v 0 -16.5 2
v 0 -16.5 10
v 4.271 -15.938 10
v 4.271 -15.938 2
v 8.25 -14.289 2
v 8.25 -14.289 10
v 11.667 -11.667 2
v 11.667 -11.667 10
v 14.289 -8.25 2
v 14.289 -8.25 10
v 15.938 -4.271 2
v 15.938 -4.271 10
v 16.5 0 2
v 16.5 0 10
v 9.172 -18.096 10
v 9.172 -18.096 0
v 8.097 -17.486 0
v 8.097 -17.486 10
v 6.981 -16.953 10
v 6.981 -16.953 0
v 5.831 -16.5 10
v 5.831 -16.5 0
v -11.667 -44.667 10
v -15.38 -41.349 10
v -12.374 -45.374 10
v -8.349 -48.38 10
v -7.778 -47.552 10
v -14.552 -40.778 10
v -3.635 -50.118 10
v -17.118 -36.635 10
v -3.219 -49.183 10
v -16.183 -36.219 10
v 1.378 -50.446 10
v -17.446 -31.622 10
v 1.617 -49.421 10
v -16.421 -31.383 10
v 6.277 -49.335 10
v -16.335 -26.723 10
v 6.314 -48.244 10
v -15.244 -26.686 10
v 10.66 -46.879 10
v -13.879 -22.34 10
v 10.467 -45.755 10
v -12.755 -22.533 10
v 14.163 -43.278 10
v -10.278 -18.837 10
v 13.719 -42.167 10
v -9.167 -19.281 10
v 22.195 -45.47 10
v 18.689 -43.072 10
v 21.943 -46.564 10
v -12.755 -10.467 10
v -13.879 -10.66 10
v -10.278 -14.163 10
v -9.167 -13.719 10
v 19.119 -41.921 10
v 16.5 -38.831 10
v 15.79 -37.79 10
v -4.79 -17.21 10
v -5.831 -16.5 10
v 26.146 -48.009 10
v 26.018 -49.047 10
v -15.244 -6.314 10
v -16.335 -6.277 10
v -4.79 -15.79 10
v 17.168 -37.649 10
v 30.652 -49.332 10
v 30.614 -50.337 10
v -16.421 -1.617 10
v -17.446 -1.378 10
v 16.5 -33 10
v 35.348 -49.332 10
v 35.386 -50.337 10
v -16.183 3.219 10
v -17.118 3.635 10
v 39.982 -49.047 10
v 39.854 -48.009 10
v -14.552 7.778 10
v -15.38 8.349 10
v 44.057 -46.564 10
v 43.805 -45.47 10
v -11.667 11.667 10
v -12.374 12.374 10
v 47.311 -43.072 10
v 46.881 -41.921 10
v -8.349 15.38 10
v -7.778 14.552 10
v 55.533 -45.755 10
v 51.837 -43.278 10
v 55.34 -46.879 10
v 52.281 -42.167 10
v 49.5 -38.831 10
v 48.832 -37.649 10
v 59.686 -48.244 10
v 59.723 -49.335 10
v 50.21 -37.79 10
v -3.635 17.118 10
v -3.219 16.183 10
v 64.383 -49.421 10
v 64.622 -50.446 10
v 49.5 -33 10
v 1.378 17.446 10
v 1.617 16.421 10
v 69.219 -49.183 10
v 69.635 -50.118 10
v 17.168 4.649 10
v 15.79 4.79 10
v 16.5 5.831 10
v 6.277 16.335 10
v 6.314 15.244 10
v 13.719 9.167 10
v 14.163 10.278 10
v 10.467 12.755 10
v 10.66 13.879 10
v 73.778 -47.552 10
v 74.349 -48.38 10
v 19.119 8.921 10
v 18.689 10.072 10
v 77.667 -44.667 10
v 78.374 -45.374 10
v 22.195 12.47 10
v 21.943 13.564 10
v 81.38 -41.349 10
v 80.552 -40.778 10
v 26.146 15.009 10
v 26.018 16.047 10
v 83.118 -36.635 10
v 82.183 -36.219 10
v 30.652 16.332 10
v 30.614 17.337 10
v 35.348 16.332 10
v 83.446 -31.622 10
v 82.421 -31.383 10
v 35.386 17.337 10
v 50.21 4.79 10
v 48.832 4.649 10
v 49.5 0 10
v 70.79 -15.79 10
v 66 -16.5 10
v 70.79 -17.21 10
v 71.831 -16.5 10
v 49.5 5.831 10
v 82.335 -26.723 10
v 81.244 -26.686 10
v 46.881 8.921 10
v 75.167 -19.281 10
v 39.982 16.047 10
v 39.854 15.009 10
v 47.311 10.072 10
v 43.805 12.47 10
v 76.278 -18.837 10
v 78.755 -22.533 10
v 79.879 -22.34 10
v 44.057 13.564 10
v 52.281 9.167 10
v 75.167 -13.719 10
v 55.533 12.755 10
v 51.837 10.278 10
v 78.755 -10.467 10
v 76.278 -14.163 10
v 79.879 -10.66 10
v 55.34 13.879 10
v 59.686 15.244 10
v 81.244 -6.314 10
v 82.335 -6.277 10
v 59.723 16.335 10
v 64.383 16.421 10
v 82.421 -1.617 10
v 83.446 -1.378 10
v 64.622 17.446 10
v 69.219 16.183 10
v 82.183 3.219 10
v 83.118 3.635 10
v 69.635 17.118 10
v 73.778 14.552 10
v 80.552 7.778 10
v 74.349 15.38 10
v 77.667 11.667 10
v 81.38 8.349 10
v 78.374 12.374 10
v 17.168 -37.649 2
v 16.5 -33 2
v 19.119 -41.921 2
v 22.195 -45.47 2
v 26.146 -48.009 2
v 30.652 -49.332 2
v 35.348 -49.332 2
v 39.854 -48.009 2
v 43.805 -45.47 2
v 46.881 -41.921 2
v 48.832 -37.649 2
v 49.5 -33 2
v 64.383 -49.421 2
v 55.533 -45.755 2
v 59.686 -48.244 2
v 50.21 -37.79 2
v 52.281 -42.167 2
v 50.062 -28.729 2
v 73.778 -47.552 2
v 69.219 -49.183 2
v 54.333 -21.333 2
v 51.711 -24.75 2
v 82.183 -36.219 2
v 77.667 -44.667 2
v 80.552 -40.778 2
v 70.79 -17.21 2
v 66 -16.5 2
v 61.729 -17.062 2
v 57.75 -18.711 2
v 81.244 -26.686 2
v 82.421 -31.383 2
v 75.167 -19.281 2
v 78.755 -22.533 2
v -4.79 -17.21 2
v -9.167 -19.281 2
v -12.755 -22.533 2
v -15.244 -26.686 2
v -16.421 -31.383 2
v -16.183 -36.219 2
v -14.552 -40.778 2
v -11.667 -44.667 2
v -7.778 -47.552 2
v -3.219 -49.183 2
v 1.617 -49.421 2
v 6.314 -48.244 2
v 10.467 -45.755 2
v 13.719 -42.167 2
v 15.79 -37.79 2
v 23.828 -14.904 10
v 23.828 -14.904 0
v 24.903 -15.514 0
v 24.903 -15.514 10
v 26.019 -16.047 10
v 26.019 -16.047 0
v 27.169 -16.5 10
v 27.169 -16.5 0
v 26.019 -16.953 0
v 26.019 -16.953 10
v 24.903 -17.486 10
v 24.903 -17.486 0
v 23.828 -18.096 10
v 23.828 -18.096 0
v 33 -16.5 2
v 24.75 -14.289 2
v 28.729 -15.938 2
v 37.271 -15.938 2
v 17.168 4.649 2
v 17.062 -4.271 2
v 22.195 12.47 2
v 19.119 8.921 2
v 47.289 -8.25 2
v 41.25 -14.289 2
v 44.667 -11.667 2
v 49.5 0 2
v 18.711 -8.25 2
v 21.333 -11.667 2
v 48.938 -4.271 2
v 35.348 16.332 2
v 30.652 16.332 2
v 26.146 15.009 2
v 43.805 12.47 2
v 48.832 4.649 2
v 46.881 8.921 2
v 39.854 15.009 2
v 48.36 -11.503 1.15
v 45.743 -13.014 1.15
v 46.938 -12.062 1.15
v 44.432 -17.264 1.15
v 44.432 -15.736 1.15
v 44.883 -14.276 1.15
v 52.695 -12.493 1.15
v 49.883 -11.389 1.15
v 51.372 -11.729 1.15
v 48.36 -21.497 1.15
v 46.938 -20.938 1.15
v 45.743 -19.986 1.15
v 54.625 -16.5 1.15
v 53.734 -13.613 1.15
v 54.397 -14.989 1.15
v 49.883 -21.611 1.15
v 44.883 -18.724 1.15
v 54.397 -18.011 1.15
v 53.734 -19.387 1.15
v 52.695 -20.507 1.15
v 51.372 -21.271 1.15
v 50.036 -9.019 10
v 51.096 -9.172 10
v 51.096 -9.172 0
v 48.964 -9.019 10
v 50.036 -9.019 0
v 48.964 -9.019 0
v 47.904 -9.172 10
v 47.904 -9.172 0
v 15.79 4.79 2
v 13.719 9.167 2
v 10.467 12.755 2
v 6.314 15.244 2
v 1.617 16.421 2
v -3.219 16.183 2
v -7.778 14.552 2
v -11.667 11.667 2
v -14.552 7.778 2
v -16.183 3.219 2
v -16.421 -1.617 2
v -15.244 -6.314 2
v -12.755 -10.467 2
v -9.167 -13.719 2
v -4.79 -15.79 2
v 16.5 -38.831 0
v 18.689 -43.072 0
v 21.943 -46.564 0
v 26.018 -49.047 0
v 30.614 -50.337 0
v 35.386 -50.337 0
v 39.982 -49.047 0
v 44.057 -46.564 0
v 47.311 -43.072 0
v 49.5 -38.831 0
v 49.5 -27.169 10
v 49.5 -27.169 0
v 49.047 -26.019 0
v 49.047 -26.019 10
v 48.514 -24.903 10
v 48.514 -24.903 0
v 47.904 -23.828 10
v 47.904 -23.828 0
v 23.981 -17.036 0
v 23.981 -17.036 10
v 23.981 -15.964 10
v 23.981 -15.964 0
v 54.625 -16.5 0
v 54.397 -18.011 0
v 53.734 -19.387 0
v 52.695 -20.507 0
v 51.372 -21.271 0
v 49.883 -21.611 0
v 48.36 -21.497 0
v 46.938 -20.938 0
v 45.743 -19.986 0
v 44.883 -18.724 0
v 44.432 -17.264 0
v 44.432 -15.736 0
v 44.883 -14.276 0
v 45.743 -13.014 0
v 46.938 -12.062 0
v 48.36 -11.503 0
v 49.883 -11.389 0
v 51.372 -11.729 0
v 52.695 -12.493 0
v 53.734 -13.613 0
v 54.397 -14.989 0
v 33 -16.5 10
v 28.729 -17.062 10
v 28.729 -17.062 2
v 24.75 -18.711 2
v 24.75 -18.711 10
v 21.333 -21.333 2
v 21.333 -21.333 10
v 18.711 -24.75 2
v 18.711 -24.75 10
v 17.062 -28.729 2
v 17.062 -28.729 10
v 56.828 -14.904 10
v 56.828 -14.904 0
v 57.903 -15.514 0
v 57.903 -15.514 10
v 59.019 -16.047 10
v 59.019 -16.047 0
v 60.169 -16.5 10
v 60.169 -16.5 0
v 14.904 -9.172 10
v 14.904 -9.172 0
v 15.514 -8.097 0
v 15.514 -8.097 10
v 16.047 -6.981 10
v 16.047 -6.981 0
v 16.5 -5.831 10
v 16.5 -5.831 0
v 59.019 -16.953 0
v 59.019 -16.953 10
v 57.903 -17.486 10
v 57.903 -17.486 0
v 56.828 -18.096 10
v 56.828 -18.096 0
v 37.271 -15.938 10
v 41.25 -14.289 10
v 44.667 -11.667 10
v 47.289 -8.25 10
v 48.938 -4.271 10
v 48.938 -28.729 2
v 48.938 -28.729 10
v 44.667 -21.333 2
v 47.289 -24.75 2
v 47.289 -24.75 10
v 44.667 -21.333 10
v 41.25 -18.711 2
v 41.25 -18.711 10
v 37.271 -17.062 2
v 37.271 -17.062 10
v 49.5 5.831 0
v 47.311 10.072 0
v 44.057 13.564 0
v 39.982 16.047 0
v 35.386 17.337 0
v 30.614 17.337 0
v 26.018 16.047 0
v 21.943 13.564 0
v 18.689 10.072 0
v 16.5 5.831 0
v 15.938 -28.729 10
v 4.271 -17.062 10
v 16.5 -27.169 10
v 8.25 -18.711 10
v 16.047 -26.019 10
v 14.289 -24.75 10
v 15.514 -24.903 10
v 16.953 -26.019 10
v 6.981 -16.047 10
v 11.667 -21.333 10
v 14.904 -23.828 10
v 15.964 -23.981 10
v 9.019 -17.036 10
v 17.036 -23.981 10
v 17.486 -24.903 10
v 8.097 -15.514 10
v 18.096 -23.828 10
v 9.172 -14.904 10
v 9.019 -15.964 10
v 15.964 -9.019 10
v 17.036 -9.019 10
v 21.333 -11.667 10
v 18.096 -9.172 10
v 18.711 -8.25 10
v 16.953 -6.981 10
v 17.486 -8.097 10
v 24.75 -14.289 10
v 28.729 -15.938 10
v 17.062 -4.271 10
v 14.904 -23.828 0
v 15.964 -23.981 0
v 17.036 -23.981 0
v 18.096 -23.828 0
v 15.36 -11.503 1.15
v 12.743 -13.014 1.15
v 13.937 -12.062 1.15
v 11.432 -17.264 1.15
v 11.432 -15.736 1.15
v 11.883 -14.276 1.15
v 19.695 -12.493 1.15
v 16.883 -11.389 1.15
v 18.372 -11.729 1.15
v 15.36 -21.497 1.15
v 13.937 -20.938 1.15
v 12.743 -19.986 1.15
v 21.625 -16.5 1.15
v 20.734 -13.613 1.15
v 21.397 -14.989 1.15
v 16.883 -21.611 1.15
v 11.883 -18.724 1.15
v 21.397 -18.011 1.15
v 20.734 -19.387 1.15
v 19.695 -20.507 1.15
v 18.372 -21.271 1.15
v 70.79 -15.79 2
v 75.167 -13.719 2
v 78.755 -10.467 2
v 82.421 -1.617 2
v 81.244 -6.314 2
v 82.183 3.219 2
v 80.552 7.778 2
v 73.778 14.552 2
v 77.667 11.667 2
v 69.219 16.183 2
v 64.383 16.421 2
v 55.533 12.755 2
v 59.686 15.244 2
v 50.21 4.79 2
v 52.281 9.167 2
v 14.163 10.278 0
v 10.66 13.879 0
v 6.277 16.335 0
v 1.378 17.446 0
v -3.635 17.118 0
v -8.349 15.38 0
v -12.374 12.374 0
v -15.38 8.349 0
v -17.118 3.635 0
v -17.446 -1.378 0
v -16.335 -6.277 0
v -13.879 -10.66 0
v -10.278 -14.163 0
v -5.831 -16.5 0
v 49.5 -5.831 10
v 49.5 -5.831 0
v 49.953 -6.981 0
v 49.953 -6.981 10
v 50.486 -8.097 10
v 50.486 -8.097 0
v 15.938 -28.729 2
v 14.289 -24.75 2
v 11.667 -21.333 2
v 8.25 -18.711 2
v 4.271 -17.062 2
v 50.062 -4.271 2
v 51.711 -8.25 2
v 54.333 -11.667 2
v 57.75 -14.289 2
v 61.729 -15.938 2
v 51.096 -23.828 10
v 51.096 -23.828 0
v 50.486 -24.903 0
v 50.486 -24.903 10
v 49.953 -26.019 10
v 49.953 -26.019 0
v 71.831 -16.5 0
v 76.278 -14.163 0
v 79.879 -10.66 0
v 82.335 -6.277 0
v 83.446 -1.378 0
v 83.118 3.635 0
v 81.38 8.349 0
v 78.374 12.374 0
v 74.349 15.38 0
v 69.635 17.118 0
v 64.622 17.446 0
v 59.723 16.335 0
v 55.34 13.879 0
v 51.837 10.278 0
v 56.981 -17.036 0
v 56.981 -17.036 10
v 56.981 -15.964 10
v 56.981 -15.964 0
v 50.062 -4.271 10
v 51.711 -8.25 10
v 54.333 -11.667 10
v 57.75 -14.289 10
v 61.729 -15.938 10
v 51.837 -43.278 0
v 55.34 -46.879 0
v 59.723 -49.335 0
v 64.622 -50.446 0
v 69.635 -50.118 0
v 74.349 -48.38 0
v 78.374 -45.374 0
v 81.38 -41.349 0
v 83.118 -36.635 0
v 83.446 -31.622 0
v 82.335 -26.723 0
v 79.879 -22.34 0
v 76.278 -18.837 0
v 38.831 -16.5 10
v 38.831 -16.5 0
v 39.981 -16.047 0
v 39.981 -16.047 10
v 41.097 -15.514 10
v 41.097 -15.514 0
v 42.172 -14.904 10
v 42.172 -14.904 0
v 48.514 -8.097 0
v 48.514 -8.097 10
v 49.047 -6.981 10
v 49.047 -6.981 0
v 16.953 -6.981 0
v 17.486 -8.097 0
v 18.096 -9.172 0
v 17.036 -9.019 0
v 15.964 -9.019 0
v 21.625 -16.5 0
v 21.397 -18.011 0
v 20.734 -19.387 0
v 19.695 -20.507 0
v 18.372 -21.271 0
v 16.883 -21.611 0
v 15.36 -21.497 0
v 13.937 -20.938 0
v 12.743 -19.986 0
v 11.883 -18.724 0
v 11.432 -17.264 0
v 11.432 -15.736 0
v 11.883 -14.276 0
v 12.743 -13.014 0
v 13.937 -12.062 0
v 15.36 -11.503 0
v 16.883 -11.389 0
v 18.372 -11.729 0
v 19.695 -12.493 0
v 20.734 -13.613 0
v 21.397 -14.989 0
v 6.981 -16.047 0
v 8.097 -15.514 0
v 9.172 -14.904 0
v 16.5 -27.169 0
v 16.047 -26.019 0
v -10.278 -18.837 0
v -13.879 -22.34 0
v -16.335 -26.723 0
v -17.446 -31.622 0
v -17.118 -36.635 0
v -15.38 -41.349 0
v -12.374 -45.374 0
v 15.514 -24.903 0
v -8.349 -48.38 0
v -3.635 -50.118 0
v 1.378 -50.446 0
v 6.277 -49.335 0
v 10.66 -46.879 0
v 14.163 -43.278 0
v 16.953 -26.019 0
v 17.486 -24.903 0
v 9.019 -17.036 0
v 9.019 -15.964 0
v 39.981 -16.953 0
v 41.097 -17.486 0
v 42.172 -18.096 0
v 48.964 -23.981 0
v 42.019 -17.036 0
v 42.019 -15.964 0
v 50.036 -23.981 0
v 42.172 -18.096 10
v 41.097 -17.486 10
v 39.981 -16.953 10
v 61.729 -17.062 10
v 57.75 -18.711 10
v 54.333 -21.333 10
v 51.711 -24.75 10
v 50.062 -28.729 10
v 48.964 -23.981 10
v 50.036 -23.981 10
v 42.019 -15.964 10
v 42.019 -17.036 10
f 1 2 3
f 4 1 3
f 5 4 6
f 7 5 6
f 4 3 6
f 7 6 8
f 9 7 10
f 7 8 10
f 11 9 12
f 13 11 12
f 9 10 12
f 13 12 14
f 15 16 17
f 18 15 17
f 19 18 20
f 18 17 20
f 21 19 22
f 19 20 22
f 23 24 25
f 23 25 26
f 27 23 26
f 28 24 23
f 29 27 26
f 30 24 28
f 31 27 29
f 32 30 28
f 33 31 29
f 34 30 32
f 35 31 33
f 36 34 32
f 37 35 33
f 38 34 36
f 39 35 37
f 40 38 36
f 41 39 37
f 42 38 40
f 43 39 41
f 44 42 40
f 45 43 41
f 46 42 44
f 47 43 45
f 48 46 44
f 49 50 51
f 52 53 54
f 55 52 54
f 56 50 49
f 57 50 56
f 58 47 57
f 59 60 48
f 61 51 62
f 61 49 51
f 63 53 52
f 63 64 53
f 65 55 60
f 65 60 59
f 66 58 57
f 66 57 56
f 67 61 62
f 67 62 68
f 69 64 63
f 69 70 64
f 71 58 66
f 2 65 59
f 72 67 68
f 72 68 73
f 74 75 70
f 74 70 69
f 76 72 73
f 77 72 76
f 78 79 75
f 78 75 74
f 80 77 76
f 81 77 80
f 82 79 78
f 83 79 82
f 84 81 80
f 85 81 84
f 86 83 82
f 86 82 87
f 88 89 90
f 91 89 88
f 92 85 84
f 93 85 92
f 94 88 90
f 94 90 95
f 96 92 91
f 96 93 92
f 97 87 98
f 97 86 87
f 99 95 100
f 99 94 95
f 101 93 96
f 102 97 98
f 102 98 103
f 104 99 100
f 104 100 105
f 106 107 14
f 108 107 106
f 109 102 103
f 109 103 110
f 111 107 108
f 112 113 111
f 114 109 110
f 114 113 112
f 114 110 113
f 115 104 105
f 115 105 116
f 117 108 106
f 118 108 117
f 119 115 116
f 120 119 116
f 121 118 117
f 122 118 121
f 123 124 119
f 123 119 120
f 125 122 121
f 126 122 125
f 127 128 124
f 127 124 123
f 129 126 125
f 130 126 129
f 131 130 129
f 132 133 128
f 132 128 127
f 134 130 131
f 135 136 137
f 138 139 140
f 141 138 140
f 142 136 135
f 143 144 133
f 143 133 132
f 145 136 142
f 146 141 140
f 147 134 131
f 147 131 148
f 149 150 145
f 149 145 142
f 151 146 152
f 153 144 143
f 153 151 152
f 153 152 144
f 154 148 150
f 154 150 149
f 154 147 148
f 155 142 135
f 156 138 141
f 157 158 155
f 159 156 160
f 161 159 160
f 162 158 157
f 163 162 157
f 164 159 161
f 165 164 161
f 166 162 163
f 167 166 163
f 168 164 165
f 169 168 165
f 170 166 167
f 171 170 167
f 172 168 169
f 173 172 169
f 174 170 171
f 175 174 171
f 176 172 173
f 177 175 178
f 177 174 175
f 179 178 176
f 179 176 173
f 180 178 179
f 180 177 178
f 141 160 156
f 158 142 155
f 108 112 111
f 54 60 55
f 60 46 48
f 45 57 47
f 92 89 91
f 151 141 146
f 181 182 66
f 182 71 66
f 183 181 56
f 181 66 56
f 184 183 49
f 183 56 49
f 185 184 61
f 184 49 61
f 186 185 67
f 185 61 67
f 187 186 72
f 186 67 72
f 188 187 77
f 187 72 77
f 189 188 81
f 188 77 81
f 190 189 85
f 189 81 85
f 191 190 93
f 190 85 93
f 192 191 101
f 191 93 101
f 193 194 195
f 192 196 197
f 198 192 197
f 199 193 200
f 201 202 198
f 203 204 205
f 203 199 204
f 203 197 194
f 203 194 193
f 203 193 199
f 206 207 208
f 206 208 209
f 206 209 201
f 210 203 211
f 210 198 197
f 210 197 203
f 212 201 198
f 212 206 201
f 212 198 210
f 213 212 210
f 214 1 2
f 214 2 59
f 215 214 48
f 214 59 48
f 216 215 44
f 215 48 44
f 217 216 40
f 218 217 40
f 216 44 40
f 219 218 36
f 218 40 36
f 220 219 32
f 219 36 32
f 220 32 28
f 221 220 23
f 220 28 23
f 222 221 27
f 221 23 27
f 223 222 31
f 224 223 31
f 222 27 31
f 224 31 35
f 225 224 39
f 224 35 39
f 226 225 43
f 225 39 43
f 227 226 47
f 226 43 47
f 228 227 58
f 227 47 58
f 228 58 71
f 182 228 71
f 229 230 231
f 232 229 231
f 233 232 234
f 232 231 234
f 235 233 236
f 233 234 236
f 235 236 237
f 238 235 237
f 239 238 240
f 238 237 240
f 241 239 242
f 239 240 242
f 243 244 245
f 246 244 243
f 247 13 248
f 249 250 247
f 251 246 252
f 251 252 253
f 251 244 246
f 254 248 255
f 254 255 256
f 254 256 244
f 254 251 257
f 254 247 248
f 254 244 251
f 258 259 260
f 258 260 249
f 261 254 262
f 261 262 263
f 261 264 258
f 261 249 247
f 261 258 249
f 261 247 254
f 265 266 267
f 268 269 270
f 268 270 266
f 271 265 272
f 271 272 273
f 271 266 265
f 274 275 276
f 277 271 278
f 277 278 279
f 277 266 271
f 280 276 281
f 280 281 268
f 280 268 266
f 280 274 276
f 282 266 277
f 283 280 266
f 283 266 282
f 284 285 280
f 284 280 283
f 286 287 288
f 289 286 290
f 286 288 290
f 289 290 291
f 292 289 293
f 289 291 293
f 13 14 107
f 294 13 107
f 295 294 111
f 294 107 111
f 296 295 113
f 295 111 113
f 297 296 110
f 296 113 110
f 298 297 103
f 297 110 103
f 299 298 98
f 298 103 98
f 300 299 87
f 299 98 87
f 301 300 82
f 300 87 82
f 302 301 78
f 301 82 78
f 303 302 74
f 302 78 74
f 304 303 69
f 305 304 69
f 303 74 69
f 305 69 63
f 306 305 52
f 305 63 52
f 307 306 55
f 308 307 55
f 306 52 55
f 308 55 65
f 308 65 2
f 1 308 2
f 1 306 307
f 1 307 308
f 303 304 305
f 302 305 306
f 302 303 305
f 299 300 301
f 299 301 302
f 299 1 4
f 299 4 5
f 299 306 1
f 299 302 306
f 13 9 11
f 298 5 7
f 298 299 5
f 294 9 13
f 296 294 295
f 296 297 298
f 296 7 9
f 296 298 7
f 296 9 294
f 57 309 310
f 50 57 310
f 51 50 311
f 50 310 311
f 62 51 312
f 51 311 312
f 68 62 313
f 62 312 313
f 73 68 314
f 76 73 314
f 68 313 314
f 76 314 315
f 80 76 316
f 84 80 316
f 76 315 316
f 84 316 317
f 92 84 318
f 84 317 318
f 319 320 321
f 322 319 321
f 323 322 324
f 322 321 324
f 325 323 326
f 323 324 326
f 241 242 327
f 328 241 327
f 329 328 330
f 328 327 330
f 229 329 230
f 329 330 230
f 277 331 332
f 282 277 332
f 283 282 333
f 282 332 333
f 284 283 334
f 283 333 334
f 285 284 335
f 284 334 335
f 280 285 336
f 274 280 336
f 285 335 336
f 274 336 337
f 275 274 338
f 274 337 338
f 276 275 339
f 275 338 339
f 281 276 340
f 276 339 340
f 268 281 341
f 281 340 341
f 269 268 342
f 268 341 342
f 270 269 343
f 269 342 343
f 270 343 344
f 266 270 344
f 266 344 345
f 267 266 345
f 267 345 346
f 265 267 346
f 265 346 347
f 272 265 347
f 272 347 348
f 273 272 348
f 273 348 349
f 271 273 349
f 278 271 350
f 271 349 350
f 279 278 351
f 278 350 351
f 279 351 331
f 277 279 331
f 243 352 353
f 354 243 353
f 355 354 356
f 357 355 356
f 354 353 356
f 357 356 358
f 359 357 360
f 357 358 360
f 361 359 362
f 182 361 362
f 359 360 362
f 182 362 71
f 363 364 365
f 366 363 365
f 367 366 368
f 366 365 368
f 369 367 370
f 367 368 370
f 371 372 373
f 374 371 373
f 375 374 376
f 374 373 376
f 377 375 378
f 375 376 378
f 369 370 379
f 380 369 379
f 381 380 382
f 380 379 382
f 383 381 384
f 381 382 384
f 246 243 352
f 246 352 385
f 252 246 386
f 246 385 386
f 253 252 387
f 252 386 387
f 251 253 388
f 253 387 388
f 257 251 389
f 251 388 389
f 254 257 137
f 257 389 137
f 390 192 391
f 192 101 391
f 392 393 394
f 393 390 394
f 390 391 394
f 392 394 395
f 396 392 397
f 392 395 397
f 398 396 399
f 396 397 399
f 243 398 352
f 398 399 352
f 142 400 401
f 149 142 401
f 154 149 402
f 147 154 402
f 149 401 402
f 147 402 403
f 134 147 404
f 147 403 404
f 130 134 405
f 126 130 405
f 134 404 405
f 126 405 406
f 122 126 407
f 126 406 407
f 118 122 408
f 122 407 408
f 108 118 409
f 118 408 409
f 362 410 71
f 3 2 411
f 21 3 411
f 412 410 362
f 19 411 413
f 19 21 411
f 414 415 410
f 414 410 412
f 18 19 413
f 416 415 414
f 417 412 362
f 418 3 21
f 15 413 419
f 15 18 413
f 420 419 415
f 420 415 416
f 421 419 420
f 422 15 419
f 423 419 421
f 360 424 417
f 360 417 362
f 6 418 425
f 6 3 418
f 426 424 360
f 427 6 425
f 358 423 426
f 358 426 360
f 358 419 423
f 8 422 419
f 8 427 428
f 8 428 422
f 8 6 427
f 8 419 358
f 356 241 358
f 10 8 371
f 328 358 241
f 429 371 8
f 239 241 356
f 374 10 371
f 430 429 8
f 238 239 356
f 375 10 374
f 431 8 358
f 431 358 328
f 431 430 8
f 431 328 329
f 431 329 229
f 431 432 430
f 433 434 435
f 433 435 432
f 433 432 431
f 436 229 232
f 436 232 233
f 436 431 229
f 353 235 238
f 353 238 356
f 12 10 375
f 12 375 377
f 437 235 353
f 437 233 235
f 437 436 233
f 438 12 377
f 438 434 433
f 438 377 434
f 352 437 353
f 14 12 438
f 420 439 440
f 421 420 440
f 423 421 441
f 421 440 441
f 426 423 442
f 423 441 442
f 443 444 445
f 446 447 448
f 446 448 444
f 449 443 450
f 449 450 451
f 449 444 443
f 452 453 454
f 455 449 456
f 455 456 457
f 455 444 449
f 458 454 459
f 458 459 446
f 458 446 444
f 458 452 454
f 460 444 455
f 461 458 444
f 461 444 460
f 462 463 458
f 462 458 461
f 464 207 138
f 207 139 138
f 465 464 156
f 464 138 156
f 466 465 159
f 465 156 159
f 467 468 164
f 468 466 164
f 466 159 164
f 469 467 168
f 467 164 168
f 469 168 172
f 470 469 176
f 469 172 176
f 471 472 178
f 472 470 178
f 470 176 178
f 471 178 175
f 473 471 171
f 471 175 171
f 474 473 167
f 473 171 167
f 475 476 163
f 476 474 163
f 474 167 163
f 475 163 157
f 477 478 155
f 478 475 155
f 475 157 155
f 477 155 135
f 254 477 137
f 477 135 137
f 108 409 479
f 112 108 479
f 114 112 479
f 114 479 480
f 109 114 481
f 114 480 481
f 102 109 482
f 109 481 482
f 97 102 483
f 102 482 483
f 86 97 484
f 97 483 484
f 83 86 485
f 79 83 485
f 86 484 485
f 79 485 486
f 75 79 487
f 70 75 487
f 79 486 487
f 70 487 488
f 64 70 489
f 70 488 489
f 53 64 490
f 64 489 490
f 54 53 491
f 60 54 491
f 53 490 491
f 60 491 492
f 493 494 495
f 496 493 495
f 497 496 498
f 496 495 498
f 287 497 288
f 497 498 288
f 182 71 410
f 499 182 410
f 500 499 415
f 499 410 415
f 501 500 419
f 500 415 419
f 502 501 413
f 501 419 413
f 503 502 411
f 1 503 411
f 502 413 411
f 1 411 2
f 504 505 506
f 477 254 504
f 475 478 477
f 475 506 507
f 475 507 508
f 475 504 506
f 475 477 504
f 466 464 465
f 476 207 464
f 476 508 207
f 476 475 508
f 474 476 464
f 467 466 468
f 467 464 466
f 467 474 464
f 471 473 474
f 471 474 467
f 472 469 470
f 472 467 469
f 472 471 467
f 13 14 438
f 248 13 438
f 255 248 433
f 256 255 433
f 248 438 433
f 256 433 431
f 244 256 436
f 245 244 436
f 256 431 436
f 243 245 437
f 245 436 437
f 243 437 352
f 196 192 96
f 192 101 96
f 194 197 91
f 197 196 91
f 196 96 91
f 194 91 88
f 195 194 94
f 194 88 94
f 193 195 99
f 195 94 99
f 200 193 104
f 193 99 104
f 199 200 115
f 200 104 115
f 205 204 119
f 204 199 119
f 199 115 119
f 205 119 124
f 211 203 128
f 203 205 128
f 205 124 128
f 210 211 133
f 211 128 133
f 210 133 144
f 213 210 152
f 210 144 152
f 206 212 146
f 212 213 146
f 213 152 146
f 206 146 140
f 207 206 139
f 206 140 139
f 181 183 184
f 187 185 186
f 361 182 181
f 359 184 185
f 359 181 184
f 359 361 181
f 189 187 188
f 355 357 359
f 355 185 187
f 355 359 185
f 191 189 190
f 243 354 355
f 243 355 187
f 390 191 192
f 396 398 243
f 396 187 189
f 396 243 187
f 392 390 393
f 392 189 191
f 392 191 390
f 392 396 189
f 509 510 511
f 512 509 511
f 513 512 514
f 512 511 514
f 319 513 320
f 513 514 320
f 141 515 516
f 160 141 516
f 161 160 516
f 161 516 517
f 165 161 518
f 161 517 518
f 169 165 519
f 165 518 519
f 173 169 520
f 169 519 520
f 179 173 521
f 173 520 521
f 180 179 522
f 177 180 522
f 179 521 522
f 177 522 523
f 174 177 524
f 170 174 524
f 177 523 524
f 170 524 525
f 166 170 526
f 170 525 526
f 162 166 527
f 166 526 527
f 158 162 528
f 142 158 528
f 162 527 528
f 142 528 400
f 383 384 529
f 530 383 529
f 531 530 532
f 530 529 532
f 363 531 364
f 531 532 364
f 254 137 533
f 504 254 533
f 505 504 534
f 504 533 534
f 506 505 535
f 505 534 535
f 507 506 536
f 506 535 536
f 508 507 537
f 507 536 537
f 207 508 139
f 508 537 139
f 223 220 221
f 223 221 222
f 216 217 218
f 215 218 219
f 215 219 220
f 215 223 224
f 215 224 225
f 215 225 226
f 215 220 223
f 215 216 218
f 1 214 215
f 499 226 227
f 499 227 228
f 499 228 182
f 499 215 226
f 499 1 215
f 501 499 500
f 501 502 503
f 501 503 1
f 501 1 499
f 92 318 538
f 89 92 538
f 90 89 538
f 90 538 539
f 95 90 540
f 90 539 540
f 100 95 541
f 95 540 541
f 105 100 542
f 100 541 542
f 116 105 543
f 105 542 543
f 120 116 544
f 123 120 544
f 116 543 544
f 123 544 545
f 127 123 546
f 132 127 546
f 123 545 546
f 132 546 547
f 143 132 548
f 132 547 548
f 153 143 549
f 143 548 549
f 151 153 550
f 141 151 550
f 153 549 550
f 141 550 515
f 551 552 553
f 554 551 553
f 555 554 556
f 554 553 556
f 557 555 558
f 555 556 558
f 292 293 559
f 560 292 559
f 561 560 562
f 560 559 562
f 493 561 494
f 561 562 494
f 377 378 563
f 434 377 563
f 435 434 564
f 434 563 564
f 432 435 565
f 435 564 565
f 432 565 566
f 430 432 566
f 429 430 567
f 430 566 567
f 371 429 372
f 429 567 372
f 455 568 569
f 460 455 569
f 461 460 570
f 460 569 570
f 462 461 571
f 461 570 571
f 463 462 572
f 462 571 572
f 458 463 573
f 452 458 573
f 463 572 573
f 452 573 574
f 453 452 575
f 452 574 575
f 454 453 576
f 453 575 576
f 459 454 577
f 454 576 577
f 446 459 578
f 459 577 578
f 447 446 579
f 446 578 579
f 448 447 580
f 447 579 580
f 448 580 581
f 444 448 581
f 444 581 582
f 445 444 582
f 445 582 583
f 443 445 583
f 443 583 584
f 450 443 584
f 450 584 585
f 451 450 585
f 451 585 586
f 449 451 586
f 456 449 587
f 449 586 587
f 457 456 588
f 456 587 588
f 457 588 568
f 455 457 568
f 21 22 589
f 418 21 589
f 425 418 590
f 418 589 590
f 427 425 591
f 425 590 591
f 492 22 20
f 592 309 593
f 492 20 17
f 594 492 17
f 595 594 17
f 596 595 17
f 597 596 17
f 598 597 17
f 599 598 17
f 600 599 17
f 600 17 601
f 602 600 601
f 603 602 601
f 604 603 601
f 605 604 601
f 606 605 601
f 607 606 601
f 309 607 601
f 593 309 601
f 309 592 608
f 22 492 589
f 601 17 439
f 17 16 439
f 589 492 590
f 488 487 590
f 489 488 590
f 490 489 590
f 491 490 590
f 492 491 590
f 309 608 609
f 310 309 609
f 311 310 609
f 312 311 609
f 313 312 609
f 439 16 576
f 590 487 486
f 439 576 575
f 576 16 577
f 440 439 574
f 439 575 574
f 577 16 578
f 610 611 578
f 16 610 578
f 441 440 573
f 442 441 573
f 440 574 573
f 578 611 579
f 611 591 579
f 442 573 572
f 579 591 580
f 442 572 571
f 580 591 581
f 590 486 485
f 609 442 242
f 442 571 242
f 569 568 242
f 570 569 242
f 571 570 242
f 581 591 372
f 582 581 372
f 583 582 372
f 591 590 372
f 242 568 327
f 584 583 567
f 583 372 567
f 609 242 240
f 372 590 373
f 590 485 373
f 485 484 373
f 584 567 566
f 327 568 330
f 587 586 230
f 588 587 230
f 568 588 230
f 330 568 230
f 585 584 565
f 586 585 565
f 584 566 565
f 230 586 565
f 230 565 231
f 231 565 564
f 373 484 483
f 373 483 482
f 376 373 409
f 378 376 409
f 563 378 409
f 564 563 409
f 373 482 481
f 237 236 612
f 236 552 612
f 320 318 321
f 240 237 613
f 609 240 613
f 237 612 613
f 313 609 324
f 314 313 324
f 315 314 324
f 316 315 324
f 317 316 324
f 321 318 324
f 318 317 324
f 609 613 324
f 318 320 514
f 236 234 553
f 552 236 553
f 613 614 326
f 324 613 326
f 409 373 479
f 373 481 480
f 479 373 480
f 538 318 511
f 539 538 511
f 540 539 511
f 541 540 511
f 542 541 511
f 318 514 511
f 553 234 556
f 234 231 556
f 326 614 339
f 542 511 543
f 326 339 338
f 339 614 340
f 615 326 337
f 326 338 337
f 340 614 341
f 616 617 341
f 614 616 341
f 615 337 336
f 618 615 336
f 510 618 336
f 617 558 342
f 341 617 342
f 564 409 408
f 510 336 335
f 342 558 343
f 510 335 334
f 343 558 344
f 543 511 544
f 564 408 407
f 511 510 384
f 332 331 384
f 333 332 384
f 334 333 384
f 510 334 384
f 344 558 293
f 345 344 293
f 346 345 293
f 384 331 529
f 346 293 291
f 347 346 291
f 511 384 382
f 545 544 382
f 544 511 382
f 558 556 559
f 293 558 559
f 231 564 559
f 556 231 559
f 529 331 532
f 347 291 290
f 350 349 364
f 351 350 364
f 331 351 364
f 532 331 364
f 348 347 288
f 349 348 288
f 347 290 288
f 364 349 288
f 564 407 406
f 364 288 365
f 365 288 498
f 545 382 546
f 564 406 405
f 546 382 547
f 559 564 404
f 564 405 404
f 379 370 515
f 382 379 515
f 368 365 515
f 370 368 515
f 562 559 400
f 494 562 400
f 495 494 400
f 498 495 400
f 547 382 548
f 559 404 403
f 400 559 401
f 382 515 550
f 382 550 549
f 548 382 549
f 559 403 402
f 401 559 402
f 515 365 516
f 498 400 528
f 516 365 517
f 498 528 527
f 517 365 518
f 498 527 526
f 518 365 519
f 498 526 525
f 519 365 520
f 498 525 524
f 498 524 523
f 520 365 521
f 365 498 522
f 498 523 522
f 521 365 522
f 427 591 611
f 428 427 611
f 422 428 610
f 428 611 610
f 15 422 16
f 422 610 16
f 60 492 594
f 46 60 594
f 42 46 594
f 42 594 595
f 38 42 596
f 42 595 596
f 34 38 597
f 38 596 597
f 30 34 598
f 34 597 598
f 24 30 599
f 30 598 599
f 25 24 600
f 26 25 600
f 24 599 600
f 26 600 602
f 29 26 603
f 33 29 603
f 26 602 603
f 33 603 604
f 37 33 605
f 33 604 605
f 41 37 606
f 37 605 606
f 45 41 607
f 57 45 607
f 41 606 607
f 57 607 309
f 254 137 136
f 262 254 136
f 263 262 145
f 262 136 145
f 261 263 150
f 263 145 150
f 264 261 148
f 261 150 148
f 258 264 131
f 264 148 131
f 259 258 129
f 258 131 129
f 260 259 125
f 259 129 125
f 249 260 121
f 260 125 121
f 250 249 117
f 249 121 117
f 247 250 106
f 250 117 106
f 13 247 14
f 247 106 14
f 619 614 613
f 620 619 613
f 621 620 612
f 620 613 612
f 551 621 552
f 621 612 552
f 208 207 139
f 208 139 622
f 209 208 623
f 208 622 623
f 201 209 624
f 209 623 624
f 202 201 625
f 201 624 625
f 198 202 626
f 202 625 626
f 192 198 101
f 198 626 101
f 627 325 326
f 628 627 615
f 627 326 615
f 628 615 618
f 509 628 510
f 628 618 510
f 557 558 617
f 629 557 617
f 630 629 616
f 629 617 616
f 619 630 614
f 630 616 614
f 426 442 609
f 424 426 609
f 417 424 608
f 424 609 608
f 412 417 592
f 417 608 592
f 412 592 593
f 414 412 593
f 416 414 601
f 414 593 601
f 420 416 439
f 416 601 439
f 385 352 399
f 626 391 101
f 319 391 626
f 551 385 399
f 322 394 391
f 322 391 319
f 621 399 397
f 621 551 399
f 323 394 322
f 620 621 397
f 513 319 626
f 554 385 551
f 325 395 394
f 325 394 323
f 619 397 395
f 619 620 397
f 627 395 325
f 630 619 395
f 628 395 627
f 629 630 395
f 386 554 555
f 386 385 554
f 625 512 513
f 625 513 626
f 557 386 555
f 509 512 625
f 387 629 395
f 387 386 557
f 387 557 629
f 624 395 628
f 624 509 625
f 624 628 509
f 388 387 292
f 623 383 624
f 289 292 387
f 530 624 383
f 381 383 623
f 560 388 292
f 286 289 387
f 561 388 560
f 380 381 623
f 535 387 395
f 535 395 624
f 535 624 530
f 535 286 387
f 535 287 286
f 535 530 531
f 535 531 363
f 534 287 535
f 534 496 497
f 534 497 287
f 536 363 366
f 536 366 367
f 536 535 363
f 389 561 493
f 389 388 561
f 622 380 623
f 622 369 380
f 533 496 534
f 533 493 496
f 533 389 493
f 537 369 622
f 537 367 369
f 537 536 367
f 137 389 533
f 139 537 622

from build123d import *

# Parameters (mm, degrees)
PAD_DEPTH       = 10
SKETCH001_R     = 16.5
POCKET_DEPTH    = 8
SKETCH002_R     = 16.5
POCKET001_DEPTH = 8
SKETCH003_R     = 16.5
POCKET002_DEPTH = 8
SKETCH004_R     = 16.5
POCKET003_DEPTH = 8
SKETCH005_R     = 16.5
POCKET004_DEPTH = 8
SKETCH006_R     = 16.5
POCKET005_DEPTH = 8
SKETCH007_R     = 5.125
POCKET006_DEPTH = 1.15
SKETCH008_R     = 5.125
POCKET007_DEPTH = 1.15


with BuildPart() as part:
    # Sketch → Pad (new body)
    with BuildSketch(Plane.XY):
        with BuildLine():
            ThreePointArc((71.830952, -16.5), (78.374369, 12.374369), (49.5, 5.830952))
            ThreePointArc((49.5, 5.830952), (33, 17.5), (16.5, 5.830952))
            ThreePointArc((16.5, 5.830952), (-12.374369, 12.374369), (-5.830952, -16.5))
            ThreePointArc((-5.830952, -16.5), (-12.374369, -45.374369), (16.5, -38.830952))
            ThreePointArc((16.5, -38.830952), (33, -50.5), (49.5, -38.830952))
            ThreePointArc((49.5, -38.830952), (78.374369, -45.374369), (71.830952, -16.5))
        make_face()
        with BuildLine():
            ThreePointArc((5.830952, -16.5), (7.543698, -15.790586), (9.171788, -14.903969))
            ThreePointArc((9.171788, -14.903969), (9, -16.5), (9.171788, -18.096031))
            ThreePointArc((9.171788, -18.096031), (7.543698, -17.209414), (5.830952, -16.5))
        make_face(mode=Mode.SUBTRACT)
        with BuildLine():
            ThreePointArc((47.903969, -9.171788), (48.790586, -7.543698), (49.5, -5.830952))
            ThreePointArc((49.5, -5.830952), (50.209414, -7.543698), (51.096031, -9.171788))
            ThreePointArc((51.096031, -9.171788), (49.5, -9), (47.903969, -9.171788))
        make_face(mode=Mode.SUBTRACT)
        with BuildLine():
            ThreePointArc((18.096031, -23.828212), (17.209414, -25.456302), (16.5, -27.169048))
            ThreePointArc((16.5, -27.169048), (15.790586, -25.456302), (14.903969, -23.828212))
            ThreePointArc((14.903969, -23.828212), (16.5, -24), (18.096031, -23.828212))
        make_face(mode=Mode.SUBTRACT)
        with BuildLine():
            ThreePointArc((47.903969, -23.828212), (49.5, -24), (51.096031, -23.828212))
            ThreePointArc((51.096031, -23.828212), (50.209414, -25.456302), (49.5, -27.169048))
            ThreePointArc((49.5, -27.169048), (48.790586, -25.456302), (47.903969, -23.828212))
        make_face(mode=Mode.SUBTRACT)
        with BuildLine():
            ThreePointArc((14.903969, -9.171788), (15.790586, -7.543698), (16.5, -5.830952))
            ThreePointArc((16.5, -5.830952), (17.209414, -7.543698), (18.096031, -9.171788))
            ThreePointArc((18.096031, -9.171788), (16.5, -9), (14.903969, -9.171788))
        make_face(mode=Mode.SUBTRACT)
        with BuildLine():
            ThreePointArc((23.828212, -18.096031), (24, -16.5), (23.828212, -14.903969))
            ThreePointArc((23.828212, -14.903969), (25.456302, -15.790586), (27.169048, -16.5))
            ThreePointArc((27.169048, -16.5), (25.456302, -17.209414), (23.828212, -18.096031))
        make_face(mode=Mode.SUBTRACT)
        with BuildLine():
            ThreePointArc((42.171788, -18.096031), (40.543698, -17.209414), (38.830952, -16.5))
            ThreePointArc((38.830952, -16.5), (40.543698, -15.790586), (42.171788, -14.903969))
            ThreePointArc((42.171788, -14.903969), (42, -16.5), (42.171788, -18.096031))
        make_face(mode=Mode.SUBTRACT)
        with BuildLine():
            ThreePointArc((56.828212, -18.096031), (57, -16.5), (56.828212, -14.903969))
            ThreePointArc((56.828212, -14.903969), (58.456302, -15.790586), (60.169048, -16.5))
            ThreePointArc((60.169048, -16.5), (58.456302, -17.209414), (56.828212, -18.096031))
        make_face(mode=Mode.SUBTRACT)
    extrude(amount=PAD_DEPTH)

    # Sketch001 (on Face32 of Pad) → Pocket (cut)
    with BuildSketch(Plane.XY.offset(10)):
        Circle(SKETCH001_R)
    extrude(amount=-POCKET_DEPTH, mode=Mode.SUBTRACT)

    # Sketch002 (on Face5 of Pocket) → Pocket001 (cut)
    with BuildSketch(Plane.XY.offset(10)):
        with Locations((33, 0)):
            Circle(SKETCH002_R)
    extrude(amount=-POCKET001_DEPTH, mode=Mode.SUBTRACT)

    # Sketch003 (on Face5 of Pocket001) → Pocket002 (cut)
    with BuildSketch(Plane.XY.offset(10)):
        with Locations((66, 0)):
            Circle(SKETCH003_R)
    extrude(amount=-POCKET002_DEPTH, mode=Mode.SUBTRACT)

    # Sketch004 (on Face5 of Pocket002) → Pocket003 (cut)
    with BuildSketch(Plane.XY.offset(10)):
        with Locations((0, -33)):
            Circle(SKETCH004_R)
    extrude(amount=-POCKET003_DEPTH, mode=Mode.SUBTRACT)

    # Sketch005 (on Face5 of Pocket003) → Pocket004 (cut)
    with BuildSketch(Plane.XY.offset(10)):
        with Locations((33, -33)):
            Circle(SKETCH005_R)
    extrude(amount=-POCKET004_DEPTH, mode=Mode.SUBTRACT)

    # Sketch006 (on Face5 of Pocket004) → Pocket005 (cut)
    with BuildSketch(Plane.XY.offset(10)):
        with Locations((66, -33)):
            Circle(SKETCH006_R)
    extrude(amount=-POCKET005_DEPTH, mode=Mode.SUBTRACT)

    # Sketch007 (on Face4 of Pocket005) → Pocket006 (cut)
    with BuildSketch(Plane(origin=(0, 0, 0), x_dir=(1, 0, 0), z_dir=(0, 0, -1))):
        with Locations((16.5, 16.5)):
            Circle(SKETCH007_R)
    extrude(amount=-POCKET006_DEPTH, mode=Mode.SUBTRACT)

    # Sketch008 (on Face4 of Pocket006) → Pocket007 (cut)
    with BuildSketch(Plane(origin=(0, 0, 0), x_dir=(1, 0, 0), z_dir=(0, 0, -1))):
        with Locations((49.5, 16.5)):
            Circle(SKETCH008_R)
    extrude(amount=-POCKET007_DEPTH, mode=Mode.SUBTRACT)


solid = part.part
